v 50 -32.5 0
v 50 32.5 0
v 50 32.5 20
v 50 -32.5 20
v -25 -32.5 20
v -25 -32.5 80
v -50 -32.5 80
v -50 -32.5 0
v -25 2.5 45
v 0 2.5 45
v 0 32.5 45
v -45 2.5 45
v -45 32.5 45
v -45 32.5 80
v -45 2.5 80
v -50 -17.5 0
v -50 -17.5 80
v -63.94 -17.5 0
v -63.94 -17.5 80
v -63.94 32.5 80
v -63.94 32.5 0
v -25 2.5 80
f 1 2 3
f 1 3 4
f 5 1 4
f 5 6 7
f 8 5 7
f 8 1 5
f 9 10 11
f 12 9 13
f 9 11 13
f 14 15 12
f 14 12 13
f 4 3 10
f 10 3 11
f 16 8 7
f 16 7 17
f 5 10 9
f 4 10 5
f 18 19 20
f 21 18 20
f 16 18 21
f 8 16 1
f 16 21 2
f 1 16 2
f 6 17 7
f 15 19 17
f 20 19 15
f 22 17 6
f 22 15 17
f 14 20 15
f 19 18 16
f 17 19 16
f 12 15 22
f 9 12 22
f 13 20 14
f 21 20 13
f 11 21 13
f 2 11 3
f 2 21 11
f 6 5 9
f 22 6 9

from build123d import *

# Parameters (mm, degrees)
SKETCH_W        = 100
SKETCH_H        = 65
PAD_DEPTH       = 20
SKETCH001_W     = 25
SKETCH001_H     = 35
PAD001_DEPTH    = 60
SKETCH002_W     = 18.940022
SKETCH002_H     = 50
PAD002_DEPTH    = 80
PAD003_DEPTH    = 25
POCKET_DEPTH    = 75
POCKET001_DEPTH = 65.001


with BuildPart() as part:
    # Sketch → Pad (new body)
    with BuildSketch(Plane.XY):
        Rectangle(SKETCH_W, SKETCH_H)
    extrude(amount=PAD_DEPTH)

    # Sketch001 → Pad001 (new body)
    with BuildSketch(Plane.XY.offset(20)):
        with Locations((-37.5, -15)):
            Rectangle(SKETCH001_W, SKETCH001_H)
    extrude(amount=PAD001_DEPTH)

    # Sketch002 → Pad002 (new body)
    with BuildSketch(Plane.XY.offset(80)):
        with Locations((-54.470011, 7.5)):
            Rectangle(SKETCH002_W, SKETCH002_H)
    extrude(amount=-PAD002_DEPTH)

    # Sketch003 → Pad003 (new body)
    with BuildSketch(Plane.XY.offset(20)):
        Polygon((-45, 32.5), (50, 32.5), (50, -32.5), (-25, -32.5), (-25, 2.5), (-45, 2.5), align=None)
    extrude(amount=PAD003_DEPTH)

    # Sketch004 → Pocket (cut)
    with BuildSketch(Plane.YZ.offset(50)):
        Polygon((-32.5, 45), (2.5, 45), (-32.5, 20), align=None)
    extrude(amount=-POCKET_DEPTH, mode=Mode.SUBTRACT)

    # Sketch005 → Pocket001 (cut, through all)
    with BuildSketch(Plane(origin=(0, 32.5, 0), x_dir=(-1, 0, 0), z_dir=(0, 1, 0))):
        Polygon((-50, 20), (0, 45), (-50, 45), align=None)
    extrude(amount=-POCKET001_DEPTH, mode=Mode.SUBTRACT)


solid = part.part
